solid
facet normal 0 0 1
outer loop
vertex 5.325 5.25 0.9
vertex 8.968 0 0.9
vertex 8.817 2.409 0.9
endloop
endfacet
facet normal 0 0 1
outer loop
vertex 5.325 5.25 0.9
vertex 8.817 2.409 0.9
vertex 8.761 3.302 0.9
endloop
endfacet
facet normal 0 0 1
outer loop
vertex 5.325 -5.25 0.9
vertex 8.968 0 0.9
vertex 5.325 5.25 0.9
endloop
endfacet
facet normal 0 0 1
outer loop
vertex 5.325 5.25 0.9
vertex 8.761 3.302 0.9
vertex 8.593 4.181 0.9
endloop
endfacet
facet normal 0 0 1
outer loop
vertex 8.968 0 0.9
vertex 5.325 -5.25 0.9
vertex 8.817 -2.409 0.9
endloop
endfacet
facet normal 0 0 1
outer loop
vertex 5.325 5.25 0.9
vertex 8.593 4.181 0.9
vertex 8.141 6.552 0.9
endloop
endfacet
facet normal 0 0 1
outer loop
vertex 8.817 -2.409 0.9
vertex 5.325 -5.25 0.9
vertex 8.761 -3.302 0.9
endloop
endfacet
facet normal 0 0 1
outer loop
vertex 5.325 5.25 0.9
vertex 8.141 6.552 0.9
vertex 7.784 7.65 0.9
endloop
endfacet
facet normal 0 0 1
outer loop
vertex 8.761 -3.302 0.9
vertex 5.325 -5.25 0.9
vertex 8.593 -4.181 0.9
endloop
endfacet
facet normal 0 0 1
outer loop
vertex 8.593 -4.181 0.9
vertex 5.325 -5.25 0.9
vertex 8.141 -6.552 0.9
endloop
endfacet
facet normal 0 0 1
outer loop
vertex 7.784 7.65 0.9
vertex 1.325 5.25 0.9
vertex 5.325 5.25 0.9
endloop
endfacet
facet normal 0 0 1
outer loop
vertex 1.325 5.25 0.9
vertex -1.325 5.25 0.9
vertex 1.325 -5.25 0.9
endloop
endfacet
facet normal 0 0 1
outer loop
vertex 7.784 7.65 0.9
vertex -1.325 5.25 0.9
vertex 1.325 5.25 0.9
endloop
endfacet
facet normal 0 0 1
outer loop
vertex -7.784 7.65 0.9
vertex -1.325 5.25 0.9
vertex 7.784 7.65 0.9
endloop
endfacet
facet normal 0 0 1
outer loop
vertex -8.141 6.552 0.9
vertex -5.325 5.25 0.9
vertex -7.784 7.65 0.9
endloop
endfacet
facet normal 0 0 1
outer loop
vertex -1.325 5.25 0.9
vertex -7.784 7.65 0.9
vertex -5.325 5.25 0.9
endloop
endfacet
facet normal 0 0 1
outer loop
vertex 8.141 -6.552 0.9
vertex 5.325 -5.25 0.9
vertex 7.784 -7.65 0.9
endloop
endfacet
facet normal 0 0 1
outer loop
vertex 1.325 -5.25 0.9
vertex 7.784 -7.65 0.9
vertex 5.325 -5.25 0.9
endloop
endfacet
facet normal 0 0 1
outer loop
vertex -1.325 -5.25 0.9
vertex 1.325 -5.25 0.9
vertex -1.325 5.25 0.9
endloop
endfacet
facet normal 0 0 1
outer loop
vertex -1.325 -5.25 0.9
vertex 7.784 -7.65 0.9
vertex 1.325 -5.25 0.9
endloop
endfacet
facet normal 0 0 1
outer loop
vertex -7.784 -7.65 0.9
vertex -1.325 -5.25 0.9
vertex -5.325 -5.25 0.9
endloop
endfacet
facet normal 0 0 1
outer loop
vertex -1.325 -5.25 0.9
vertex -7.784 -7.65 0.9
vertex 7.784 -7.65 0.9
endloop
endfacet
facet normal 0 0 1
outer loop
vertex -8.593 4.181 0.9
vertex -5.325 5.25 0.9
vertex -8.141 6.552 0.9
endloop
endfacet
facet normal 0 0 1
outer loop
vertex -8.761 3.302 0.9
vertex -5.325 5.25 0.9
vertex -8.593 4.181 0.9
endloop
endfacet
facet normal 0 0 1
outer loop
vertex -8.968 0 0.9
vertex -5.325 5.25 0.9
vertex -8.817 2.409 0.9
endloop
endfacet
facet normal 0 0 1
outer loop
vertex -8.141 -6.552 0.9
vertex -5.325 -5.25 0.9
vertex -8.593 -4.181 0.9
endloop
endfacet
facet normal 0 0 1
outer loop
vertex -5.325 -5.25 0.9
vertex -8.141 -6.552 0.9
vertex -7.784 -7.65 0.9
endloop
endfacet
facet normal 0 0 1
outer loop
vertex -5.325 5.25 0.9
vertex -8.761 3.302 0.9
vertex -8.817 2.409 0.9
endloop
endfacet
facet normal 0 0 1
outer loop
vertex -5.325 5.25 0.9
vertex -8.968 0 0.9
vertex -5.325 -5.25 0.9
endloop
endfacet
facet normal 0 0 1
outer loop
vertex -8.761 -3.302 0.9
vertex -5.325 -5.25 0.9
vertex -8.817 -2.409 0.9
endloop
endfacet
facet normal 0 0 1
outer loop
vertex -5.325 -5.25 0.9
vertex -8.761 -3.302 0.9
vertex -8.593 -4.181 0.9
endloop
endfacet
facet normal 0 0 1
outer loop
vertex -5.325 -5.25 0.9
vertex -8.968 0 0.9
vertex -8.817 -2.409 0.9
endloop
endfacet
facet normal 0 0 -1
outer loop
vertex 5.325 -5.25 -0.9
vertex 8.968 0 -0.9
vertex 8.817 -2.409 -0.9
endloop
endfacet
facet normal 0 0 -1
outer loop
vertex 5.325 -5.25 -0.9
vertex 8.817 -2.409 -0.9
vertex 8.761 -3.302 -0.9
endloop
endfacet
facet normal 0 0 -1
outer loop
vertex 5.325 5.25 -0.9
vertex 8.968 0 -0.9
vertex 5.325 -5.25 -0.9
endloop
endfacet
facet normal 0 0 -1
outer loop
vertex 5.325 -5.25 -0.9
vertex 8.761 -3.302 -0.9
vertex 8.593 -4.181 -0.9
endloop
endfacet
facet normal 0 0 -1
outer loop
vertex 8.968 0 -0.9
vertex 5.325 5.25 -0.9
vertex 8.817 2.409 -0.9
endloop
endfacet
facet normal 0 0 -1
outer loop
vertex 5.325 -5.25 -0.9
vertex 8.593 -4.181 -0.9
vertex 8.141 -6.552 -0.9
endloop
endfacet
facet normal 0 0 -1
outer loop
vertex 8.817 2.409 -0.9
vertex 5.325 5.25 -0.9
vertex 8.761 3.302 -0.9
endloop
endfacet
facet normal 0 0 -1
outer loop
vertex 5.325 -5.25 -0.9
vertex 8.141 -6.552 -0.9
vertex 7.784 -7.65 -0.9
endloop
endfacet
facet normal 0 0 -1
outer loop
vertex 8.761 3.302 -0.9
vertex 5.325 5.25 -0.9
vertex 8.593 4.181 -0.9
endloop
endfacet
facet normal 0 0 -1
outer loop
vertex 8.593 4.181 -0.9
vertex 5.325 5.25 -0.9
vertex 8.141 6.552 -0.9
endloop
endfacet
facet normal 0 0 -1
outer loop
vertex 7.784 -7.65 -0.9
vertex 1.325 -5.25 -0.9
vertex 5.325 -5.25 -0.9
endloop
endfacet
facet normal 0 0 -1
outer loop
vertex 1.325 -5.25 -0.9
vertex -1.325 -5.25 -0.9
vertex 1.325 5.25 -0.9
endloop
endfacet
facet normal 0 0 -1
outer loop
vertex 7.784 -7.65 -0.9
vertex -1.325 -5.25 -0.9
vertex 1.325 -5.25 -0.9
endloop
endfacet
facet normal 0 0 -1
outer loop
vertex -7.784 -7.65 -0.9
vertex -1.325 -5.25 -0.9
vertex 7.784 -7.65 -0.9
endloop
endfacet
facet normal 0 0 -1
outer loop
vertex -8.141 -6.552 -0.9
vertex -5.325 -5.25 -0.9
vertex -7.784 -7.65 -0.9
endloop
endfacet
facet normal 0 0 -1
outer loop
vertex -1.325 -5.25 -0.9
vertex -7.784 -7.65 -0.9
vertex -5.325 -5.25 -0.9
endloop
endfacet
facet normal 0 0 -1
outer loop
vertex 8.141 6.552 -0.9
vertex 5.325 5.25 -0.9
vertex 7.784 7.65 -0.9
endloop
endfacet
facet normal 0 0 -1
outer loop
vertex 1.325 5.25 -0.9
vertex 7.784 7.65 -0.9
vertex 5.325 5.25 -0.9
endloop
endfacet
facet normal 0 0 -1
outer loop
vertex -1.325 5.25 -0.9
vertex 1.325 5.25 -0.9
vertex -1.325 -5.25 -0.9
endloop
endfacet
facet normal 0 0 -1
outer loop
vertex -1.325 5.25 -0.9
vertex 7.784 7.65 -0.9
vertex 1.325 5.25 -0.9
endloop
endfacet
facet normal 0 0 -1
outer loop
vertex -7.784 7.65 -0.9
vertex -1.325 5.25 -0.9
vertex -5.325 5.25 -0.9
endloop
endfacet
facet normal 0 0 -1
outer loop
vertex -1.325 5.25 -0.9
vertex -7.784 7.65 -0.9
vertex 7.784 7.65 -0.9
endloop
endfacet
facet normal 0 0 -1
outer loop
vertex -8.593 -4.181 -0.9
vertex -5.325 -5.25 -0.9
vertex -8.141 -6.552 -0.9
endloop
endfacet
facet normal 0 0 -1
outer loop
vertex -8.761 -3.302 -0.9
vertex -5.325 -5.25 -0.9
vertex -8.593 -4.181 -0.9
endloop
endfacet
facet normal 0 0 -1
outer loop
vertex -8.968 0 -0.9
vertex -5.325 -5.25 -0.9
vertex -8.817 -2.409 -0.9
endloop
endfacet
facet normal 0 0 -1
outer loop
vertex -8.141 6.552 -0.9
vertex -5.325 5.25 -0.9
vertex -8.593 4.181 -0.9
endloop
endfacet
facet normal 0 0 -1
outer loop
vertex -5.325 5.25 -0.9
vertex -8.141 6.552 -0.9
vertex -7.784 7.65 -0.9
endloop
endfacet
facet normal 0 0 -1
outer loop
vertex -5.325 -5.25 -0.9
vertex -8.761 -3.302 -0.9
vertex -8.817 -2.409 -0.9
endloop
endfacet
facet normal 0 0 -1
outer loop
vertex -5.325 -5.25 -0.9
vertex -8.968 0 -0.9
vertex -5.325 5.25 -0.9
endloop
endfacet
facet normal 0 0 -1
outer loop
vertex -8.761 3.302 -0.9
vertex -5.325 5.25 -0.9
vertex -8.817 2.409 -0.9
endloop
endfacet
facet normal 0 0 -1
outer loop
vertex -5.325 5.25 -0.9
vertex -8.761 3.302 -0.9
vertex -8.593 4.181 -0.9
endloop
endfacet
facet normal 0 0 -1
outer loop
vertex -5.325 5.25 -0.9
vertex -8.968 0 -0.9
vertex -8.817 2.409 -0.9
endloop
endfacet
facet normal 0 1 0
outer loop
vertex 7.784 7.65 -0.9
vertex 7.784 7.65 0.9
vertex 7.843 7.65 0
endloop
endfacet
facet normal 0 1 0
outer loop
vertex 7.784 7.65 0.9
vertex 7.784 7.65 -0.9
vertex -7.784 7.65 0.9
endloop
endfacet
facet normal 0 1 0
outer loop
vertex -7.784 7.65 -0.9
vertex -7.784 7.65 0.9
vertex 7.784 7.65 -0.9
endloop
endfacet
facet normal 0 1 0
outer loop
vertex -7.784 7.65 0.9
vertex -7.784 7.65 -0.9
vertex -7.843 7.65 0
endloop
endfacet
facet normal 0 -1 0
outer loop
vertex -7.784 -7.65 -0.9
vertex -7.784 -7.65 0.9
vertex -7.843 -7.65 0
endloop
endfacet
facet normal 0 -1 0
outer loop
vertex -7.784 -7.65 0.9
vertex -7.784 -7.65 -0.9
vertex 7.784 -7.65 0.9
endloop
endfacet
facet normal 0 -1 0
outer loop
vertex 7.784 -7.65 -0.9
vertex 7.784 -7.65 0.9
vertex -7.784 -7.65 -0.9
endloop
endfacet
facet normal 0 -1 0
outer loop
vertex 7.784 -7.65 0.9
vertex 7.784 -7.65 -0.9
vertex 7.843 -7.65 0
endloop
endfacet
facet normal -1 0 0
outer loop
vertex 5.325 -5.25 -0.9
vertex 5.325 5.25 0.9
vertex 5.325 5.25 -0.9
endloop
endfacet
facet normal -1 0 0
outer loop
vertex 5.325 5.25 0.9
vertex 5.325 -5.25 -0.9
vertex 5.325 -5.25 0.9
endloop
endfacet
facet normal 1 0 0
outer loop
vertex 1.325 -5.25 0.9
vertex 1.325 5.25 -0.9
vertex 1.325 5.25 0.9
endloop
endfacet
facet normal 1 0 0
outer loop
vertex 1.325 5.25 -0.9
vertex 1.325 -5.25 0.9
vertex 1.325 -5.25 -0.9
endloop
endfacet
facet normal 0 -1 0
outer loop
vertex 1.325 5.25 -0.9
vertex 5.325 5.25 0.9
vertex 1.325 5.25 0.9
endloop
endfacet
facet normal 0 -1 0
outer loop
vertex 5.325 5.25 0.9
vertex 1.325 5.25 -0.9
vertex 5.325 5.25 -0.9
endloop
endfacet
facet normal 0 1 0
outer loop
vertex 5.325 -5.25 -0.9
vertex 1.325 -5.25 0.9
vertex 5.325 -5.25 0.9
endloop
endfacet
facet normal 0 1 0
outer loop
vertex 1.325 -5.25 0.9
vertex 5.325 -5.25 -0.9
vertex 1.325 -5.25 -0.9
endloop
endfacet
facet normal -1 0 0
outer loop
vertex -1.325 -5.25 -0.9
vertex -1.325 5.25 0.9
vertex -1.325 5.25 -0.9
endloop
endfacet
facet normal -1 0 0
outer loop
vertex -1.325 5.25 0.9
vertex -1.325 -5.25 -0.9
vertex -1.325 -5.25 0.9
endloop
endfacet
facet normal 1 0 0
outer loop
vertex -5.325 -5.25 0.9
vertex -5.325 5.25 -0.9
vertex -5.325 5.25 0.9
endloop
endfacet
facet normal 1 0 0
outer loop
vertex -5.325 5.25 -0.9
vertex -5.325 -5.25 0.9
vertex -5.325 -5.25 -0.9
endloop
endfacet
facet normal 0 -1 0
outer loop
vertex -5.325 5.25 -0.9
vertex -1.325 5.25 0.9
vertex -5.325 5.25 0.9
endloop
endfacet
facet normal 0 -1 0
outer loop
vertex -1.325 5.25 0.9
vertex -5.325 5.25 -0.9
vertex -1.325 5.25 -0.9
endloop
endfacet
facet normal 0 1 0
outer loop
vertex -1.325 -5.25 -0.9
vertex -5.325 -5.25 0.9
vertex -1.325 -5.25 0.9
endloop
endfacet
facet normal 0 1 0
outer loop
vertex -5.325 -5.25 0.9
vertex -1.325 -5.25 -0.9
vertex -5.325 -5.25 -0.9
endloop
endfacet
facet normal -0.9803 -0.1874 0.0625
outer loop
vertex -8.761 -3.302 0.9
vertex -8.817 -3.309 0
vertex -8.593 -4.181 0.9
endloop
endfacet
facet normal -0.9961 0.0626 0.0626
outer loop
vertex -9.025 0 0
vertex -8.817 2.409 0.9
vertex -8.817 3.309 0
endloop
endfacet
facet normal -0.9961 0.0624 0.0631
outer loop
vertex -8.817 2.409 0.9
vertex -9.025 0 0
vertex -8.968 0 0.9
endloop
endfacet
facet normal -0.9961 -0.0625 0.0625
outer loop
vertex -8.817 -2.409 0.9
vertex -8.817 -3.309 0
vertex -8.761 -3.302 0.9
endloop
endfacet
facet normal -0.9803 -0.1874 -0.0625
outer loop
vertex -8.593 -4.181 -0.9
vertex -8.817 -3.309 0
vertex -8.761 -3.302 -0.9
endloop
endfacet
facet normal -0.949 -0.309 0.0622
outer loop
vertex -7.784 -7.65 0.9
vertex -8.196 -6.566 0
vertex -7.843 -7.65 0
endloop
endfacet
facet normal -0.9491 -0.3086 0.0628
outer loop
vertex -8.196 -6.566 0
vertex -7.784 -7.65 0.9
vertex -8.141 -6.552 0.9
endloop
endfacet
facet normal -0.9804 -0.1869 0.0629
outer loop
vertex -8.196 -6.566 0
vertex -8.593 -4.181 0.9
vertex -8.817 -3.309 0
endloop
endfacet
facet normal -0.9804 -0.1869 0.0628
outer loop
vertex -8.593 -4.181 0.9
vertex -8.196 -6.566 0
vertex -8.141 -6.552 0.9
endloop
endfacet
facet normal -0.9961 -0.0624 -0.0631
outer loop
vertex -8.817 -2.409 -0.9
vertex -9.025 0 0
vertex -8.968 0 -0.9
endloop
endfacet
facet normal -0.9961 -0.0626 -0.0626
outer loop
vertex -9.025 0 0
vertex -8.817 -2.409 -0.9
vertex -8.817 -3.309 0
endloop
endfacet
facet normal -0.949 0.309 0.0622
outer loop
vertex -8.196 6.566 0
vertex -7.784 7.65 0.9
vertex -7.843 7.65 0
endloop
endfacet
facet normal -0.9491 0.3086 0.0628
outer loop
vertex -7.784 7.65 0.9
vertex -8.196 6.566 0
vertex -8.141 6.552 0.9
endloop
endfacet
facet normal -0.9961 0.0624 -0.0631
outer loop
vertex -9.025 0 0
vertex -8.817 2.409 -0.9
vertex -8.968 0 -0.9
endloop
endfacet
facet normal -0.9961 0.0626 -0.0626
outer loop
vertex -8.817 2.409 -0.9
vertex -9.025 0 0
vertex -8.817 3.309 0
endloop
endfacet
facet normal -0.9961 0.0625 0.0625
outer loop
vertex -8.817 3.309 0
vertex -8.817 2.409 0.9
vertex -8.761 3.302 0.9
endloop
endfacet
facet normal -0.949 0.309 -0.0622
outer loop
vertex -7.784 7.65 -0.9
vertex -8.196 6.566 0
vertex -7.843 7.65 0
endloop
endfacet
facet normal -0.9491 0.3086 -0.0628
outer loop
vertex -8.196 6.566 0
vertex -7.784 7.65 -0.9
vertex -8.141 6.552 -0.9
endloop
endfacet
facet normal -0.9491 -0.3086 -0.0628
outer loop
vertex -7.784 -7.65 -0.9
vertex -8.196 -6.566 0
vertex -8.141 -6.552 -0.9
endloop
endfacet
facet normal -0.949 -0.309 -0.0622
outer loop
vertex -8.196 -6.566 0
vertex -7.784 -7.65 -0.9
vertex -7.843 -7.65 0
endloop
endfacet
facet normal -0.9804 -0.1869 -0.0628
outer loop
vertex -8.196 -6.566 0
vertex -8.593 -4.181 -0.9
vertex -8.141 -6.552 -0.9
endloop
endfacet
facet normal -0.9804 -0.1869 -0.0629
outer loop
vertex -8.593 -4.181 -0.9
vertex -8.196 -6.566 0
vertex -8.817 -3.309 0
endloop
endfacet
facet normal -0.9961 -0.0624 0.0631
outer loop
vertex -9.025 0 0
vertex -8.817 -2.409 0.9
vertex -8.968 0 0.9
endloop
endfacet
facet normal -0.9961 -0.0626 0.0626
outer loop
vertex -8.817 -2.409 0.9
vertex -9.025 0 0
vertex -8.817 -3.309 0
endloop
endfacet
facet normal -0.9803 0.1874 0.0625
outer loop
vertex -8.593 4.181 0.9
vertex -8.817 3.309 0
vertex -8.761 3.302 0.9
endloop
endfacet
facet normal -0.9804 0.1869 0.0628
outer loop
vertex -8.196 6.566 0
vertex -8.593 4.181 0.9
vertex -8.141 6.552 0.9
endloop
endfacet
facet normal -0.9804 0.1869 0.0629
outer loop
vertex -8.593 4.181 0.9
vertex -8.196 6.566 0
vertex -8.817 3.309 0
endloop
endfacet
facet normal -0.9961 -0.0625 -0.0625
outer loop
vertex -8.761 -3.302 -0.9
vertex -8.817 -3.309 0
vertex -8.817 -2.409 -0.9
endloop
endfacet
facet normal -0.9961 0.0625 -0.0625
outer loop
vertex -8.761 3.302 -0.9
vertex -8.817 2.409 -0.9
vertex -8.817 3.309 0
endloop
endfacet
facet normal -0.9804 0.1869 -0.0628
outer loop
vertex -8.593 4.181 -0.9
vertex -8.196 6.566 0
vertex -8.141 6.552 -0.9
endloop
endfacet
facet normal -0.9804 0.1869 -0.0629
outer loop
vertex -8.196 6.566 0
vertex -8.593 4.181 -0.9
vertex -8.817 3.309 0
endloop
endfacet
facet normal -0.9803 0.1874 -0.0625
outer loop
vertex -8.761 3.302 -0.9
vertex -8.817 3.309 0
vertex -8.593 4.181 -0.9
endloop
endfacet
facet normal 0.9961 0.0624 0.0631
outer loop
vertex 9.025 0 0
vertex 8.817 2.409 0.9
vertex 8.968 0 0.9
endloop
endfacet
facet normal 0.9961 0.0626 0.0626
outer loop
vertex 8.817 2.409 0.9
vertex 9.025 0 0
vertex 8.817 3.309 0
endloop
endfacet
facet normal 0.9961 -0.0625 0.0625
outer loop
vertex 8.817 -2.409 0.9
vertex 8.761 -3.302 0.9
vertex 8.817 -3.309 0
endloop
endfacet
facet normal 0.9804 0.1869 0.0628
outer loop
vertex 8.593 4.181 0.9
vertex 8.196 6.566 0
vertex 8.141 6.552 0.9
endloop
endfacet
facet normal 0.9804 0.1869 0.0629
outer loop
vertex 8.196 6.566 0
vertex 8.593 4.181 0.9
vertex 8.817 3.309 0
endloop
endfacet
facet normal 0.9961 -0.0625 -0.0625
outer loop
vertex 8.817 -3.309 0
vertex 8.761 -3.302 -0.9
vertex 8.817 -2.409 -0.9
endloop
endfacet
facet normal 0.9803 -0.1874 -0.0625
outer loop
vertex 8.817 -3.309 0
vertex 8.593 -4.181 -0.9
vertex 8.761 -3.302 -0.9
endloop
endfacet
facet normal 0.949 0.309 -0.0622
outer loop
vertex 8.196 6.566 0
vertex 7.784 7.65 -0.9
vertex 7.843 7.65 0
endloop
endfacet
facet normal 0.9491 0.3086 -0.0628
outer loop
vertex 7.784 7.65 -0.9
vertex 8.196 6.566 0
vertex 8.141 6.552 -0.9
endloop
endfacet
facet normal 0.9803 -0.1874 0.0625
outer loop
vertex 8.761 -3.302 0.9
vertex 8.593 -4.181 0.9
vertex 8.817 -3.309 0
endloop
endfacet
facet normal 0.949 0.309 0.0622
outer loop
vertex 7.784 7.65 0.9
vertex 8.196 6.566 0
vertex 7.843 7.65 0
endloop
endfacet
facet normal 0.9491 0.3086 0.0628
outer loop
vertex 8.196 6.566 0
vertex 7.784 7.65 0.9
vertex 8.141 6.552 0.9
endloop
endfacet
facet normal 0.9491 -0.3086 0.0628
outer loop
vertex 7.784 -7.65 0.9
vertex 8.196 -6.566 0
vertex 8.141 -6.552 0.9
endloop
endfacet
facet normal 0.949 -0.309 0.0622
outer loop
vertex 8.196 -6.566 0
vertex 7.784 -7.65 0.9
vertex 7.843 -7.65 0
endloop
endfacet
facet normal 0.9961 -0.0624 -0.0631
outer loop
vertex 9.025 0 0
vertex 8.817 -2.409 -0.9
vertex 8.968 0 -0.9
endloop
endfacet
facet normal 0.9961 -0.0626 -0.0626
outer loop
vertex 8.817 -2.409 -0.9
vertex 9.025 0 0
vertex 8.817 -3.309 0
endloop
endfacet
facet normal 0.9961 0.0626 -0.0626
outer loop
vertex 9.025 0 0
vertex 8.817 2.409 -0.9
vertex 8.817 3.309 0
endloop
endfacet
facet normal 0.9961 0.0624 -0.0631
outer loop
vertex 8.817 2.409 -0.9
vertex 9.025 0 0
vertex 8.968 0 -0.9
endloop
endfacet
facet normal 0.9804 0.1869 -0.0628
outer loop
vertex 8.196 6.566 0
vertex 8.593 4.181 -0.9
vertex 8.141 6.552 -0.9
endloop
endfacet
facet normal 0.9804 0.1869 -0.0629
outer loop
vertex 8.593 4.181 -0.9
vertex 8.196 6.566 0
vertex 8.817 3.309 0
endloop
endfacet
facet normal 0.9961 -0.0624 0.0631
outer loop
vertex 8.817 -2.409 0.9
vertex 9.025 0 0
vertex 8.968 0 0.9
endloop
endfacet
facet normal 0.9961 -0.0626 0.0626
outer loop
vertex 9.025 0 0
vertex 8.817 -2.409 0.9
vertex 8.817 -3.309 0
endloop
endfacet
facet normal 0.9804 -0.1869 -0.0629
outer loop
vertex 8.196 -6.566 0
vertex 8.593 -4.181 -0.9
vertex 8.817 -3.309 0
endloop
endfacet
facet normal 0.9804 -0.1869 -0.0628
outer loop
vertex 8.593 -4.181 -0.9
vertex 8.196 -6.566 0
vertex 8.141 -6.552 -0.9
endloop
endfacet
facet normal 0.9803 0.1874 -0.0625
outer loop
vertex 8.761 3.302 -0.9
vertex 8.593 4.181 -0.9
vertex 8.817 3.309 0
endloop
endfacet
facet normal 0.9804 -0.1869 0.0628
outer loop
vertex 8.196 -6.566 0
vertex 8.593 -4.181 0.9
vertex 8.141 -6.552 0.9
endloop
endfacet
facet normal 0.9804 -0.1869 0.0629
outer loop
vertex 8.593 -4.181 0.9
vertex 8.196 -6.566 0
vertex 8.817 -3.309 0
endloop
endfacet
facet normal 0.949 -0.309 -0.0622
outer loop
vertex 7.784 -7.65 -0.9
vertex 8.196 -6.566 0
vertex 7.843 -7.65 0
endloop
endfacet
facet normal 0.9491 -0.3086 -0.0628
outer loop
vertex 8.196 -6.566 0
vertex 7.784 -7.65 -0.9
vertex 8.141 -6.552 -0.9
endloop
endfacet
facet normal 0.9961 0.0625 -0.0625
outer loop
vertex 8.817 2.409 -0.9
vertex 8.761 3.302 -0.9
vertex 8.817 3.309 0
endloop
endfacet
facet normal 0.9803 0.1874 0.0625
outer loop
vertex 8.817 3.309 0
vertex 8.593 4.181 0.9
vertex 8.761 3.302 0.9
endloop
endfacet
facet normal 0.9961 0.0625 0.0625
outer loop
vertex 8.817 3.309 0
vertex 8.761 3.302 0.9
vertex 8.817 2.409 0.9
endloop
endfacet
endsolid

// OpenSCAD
// strap buckle customizable
// speedo goggles w=10.3 d=1.9 h=1.8

strap_width=10.3; // mm
strap_depth=1.9; // mm

total_width=strap_depth*2+strap_depth*2+strap_depth*1.5+strap_depth*2+strap_depth*2;
total_depth=strap_width+5;
total_height=1.8; // mm
t=0.2*1; // tolerance for holes

intersection()
{
    difference()
    {
        // main buckle block
        cube([total_width,total_depth,total_height], center=true);
        // holes for strap
        translate([strap_depth*1.75,0,0])
            cube([strap_depth*2+t,strap_width+t,total_height+t],center=true);
        translate([-strap_depth*1.75,0,0])
            cube([strap_depth*2+t,strap_width+t,total_height+t],center=true);
    }
    
    // intersection to shape rounded borders with two spheres
    translate([pow(total_depth,1.2)-total_width/2,0,0])
        sphere(pow(total_depth,1.2),$fn=50);
    translate([-pow(total_depth,1.2)+total_width/2,0,0])
        sphere(pow(total_depth,1.2),$fn=50);
}
